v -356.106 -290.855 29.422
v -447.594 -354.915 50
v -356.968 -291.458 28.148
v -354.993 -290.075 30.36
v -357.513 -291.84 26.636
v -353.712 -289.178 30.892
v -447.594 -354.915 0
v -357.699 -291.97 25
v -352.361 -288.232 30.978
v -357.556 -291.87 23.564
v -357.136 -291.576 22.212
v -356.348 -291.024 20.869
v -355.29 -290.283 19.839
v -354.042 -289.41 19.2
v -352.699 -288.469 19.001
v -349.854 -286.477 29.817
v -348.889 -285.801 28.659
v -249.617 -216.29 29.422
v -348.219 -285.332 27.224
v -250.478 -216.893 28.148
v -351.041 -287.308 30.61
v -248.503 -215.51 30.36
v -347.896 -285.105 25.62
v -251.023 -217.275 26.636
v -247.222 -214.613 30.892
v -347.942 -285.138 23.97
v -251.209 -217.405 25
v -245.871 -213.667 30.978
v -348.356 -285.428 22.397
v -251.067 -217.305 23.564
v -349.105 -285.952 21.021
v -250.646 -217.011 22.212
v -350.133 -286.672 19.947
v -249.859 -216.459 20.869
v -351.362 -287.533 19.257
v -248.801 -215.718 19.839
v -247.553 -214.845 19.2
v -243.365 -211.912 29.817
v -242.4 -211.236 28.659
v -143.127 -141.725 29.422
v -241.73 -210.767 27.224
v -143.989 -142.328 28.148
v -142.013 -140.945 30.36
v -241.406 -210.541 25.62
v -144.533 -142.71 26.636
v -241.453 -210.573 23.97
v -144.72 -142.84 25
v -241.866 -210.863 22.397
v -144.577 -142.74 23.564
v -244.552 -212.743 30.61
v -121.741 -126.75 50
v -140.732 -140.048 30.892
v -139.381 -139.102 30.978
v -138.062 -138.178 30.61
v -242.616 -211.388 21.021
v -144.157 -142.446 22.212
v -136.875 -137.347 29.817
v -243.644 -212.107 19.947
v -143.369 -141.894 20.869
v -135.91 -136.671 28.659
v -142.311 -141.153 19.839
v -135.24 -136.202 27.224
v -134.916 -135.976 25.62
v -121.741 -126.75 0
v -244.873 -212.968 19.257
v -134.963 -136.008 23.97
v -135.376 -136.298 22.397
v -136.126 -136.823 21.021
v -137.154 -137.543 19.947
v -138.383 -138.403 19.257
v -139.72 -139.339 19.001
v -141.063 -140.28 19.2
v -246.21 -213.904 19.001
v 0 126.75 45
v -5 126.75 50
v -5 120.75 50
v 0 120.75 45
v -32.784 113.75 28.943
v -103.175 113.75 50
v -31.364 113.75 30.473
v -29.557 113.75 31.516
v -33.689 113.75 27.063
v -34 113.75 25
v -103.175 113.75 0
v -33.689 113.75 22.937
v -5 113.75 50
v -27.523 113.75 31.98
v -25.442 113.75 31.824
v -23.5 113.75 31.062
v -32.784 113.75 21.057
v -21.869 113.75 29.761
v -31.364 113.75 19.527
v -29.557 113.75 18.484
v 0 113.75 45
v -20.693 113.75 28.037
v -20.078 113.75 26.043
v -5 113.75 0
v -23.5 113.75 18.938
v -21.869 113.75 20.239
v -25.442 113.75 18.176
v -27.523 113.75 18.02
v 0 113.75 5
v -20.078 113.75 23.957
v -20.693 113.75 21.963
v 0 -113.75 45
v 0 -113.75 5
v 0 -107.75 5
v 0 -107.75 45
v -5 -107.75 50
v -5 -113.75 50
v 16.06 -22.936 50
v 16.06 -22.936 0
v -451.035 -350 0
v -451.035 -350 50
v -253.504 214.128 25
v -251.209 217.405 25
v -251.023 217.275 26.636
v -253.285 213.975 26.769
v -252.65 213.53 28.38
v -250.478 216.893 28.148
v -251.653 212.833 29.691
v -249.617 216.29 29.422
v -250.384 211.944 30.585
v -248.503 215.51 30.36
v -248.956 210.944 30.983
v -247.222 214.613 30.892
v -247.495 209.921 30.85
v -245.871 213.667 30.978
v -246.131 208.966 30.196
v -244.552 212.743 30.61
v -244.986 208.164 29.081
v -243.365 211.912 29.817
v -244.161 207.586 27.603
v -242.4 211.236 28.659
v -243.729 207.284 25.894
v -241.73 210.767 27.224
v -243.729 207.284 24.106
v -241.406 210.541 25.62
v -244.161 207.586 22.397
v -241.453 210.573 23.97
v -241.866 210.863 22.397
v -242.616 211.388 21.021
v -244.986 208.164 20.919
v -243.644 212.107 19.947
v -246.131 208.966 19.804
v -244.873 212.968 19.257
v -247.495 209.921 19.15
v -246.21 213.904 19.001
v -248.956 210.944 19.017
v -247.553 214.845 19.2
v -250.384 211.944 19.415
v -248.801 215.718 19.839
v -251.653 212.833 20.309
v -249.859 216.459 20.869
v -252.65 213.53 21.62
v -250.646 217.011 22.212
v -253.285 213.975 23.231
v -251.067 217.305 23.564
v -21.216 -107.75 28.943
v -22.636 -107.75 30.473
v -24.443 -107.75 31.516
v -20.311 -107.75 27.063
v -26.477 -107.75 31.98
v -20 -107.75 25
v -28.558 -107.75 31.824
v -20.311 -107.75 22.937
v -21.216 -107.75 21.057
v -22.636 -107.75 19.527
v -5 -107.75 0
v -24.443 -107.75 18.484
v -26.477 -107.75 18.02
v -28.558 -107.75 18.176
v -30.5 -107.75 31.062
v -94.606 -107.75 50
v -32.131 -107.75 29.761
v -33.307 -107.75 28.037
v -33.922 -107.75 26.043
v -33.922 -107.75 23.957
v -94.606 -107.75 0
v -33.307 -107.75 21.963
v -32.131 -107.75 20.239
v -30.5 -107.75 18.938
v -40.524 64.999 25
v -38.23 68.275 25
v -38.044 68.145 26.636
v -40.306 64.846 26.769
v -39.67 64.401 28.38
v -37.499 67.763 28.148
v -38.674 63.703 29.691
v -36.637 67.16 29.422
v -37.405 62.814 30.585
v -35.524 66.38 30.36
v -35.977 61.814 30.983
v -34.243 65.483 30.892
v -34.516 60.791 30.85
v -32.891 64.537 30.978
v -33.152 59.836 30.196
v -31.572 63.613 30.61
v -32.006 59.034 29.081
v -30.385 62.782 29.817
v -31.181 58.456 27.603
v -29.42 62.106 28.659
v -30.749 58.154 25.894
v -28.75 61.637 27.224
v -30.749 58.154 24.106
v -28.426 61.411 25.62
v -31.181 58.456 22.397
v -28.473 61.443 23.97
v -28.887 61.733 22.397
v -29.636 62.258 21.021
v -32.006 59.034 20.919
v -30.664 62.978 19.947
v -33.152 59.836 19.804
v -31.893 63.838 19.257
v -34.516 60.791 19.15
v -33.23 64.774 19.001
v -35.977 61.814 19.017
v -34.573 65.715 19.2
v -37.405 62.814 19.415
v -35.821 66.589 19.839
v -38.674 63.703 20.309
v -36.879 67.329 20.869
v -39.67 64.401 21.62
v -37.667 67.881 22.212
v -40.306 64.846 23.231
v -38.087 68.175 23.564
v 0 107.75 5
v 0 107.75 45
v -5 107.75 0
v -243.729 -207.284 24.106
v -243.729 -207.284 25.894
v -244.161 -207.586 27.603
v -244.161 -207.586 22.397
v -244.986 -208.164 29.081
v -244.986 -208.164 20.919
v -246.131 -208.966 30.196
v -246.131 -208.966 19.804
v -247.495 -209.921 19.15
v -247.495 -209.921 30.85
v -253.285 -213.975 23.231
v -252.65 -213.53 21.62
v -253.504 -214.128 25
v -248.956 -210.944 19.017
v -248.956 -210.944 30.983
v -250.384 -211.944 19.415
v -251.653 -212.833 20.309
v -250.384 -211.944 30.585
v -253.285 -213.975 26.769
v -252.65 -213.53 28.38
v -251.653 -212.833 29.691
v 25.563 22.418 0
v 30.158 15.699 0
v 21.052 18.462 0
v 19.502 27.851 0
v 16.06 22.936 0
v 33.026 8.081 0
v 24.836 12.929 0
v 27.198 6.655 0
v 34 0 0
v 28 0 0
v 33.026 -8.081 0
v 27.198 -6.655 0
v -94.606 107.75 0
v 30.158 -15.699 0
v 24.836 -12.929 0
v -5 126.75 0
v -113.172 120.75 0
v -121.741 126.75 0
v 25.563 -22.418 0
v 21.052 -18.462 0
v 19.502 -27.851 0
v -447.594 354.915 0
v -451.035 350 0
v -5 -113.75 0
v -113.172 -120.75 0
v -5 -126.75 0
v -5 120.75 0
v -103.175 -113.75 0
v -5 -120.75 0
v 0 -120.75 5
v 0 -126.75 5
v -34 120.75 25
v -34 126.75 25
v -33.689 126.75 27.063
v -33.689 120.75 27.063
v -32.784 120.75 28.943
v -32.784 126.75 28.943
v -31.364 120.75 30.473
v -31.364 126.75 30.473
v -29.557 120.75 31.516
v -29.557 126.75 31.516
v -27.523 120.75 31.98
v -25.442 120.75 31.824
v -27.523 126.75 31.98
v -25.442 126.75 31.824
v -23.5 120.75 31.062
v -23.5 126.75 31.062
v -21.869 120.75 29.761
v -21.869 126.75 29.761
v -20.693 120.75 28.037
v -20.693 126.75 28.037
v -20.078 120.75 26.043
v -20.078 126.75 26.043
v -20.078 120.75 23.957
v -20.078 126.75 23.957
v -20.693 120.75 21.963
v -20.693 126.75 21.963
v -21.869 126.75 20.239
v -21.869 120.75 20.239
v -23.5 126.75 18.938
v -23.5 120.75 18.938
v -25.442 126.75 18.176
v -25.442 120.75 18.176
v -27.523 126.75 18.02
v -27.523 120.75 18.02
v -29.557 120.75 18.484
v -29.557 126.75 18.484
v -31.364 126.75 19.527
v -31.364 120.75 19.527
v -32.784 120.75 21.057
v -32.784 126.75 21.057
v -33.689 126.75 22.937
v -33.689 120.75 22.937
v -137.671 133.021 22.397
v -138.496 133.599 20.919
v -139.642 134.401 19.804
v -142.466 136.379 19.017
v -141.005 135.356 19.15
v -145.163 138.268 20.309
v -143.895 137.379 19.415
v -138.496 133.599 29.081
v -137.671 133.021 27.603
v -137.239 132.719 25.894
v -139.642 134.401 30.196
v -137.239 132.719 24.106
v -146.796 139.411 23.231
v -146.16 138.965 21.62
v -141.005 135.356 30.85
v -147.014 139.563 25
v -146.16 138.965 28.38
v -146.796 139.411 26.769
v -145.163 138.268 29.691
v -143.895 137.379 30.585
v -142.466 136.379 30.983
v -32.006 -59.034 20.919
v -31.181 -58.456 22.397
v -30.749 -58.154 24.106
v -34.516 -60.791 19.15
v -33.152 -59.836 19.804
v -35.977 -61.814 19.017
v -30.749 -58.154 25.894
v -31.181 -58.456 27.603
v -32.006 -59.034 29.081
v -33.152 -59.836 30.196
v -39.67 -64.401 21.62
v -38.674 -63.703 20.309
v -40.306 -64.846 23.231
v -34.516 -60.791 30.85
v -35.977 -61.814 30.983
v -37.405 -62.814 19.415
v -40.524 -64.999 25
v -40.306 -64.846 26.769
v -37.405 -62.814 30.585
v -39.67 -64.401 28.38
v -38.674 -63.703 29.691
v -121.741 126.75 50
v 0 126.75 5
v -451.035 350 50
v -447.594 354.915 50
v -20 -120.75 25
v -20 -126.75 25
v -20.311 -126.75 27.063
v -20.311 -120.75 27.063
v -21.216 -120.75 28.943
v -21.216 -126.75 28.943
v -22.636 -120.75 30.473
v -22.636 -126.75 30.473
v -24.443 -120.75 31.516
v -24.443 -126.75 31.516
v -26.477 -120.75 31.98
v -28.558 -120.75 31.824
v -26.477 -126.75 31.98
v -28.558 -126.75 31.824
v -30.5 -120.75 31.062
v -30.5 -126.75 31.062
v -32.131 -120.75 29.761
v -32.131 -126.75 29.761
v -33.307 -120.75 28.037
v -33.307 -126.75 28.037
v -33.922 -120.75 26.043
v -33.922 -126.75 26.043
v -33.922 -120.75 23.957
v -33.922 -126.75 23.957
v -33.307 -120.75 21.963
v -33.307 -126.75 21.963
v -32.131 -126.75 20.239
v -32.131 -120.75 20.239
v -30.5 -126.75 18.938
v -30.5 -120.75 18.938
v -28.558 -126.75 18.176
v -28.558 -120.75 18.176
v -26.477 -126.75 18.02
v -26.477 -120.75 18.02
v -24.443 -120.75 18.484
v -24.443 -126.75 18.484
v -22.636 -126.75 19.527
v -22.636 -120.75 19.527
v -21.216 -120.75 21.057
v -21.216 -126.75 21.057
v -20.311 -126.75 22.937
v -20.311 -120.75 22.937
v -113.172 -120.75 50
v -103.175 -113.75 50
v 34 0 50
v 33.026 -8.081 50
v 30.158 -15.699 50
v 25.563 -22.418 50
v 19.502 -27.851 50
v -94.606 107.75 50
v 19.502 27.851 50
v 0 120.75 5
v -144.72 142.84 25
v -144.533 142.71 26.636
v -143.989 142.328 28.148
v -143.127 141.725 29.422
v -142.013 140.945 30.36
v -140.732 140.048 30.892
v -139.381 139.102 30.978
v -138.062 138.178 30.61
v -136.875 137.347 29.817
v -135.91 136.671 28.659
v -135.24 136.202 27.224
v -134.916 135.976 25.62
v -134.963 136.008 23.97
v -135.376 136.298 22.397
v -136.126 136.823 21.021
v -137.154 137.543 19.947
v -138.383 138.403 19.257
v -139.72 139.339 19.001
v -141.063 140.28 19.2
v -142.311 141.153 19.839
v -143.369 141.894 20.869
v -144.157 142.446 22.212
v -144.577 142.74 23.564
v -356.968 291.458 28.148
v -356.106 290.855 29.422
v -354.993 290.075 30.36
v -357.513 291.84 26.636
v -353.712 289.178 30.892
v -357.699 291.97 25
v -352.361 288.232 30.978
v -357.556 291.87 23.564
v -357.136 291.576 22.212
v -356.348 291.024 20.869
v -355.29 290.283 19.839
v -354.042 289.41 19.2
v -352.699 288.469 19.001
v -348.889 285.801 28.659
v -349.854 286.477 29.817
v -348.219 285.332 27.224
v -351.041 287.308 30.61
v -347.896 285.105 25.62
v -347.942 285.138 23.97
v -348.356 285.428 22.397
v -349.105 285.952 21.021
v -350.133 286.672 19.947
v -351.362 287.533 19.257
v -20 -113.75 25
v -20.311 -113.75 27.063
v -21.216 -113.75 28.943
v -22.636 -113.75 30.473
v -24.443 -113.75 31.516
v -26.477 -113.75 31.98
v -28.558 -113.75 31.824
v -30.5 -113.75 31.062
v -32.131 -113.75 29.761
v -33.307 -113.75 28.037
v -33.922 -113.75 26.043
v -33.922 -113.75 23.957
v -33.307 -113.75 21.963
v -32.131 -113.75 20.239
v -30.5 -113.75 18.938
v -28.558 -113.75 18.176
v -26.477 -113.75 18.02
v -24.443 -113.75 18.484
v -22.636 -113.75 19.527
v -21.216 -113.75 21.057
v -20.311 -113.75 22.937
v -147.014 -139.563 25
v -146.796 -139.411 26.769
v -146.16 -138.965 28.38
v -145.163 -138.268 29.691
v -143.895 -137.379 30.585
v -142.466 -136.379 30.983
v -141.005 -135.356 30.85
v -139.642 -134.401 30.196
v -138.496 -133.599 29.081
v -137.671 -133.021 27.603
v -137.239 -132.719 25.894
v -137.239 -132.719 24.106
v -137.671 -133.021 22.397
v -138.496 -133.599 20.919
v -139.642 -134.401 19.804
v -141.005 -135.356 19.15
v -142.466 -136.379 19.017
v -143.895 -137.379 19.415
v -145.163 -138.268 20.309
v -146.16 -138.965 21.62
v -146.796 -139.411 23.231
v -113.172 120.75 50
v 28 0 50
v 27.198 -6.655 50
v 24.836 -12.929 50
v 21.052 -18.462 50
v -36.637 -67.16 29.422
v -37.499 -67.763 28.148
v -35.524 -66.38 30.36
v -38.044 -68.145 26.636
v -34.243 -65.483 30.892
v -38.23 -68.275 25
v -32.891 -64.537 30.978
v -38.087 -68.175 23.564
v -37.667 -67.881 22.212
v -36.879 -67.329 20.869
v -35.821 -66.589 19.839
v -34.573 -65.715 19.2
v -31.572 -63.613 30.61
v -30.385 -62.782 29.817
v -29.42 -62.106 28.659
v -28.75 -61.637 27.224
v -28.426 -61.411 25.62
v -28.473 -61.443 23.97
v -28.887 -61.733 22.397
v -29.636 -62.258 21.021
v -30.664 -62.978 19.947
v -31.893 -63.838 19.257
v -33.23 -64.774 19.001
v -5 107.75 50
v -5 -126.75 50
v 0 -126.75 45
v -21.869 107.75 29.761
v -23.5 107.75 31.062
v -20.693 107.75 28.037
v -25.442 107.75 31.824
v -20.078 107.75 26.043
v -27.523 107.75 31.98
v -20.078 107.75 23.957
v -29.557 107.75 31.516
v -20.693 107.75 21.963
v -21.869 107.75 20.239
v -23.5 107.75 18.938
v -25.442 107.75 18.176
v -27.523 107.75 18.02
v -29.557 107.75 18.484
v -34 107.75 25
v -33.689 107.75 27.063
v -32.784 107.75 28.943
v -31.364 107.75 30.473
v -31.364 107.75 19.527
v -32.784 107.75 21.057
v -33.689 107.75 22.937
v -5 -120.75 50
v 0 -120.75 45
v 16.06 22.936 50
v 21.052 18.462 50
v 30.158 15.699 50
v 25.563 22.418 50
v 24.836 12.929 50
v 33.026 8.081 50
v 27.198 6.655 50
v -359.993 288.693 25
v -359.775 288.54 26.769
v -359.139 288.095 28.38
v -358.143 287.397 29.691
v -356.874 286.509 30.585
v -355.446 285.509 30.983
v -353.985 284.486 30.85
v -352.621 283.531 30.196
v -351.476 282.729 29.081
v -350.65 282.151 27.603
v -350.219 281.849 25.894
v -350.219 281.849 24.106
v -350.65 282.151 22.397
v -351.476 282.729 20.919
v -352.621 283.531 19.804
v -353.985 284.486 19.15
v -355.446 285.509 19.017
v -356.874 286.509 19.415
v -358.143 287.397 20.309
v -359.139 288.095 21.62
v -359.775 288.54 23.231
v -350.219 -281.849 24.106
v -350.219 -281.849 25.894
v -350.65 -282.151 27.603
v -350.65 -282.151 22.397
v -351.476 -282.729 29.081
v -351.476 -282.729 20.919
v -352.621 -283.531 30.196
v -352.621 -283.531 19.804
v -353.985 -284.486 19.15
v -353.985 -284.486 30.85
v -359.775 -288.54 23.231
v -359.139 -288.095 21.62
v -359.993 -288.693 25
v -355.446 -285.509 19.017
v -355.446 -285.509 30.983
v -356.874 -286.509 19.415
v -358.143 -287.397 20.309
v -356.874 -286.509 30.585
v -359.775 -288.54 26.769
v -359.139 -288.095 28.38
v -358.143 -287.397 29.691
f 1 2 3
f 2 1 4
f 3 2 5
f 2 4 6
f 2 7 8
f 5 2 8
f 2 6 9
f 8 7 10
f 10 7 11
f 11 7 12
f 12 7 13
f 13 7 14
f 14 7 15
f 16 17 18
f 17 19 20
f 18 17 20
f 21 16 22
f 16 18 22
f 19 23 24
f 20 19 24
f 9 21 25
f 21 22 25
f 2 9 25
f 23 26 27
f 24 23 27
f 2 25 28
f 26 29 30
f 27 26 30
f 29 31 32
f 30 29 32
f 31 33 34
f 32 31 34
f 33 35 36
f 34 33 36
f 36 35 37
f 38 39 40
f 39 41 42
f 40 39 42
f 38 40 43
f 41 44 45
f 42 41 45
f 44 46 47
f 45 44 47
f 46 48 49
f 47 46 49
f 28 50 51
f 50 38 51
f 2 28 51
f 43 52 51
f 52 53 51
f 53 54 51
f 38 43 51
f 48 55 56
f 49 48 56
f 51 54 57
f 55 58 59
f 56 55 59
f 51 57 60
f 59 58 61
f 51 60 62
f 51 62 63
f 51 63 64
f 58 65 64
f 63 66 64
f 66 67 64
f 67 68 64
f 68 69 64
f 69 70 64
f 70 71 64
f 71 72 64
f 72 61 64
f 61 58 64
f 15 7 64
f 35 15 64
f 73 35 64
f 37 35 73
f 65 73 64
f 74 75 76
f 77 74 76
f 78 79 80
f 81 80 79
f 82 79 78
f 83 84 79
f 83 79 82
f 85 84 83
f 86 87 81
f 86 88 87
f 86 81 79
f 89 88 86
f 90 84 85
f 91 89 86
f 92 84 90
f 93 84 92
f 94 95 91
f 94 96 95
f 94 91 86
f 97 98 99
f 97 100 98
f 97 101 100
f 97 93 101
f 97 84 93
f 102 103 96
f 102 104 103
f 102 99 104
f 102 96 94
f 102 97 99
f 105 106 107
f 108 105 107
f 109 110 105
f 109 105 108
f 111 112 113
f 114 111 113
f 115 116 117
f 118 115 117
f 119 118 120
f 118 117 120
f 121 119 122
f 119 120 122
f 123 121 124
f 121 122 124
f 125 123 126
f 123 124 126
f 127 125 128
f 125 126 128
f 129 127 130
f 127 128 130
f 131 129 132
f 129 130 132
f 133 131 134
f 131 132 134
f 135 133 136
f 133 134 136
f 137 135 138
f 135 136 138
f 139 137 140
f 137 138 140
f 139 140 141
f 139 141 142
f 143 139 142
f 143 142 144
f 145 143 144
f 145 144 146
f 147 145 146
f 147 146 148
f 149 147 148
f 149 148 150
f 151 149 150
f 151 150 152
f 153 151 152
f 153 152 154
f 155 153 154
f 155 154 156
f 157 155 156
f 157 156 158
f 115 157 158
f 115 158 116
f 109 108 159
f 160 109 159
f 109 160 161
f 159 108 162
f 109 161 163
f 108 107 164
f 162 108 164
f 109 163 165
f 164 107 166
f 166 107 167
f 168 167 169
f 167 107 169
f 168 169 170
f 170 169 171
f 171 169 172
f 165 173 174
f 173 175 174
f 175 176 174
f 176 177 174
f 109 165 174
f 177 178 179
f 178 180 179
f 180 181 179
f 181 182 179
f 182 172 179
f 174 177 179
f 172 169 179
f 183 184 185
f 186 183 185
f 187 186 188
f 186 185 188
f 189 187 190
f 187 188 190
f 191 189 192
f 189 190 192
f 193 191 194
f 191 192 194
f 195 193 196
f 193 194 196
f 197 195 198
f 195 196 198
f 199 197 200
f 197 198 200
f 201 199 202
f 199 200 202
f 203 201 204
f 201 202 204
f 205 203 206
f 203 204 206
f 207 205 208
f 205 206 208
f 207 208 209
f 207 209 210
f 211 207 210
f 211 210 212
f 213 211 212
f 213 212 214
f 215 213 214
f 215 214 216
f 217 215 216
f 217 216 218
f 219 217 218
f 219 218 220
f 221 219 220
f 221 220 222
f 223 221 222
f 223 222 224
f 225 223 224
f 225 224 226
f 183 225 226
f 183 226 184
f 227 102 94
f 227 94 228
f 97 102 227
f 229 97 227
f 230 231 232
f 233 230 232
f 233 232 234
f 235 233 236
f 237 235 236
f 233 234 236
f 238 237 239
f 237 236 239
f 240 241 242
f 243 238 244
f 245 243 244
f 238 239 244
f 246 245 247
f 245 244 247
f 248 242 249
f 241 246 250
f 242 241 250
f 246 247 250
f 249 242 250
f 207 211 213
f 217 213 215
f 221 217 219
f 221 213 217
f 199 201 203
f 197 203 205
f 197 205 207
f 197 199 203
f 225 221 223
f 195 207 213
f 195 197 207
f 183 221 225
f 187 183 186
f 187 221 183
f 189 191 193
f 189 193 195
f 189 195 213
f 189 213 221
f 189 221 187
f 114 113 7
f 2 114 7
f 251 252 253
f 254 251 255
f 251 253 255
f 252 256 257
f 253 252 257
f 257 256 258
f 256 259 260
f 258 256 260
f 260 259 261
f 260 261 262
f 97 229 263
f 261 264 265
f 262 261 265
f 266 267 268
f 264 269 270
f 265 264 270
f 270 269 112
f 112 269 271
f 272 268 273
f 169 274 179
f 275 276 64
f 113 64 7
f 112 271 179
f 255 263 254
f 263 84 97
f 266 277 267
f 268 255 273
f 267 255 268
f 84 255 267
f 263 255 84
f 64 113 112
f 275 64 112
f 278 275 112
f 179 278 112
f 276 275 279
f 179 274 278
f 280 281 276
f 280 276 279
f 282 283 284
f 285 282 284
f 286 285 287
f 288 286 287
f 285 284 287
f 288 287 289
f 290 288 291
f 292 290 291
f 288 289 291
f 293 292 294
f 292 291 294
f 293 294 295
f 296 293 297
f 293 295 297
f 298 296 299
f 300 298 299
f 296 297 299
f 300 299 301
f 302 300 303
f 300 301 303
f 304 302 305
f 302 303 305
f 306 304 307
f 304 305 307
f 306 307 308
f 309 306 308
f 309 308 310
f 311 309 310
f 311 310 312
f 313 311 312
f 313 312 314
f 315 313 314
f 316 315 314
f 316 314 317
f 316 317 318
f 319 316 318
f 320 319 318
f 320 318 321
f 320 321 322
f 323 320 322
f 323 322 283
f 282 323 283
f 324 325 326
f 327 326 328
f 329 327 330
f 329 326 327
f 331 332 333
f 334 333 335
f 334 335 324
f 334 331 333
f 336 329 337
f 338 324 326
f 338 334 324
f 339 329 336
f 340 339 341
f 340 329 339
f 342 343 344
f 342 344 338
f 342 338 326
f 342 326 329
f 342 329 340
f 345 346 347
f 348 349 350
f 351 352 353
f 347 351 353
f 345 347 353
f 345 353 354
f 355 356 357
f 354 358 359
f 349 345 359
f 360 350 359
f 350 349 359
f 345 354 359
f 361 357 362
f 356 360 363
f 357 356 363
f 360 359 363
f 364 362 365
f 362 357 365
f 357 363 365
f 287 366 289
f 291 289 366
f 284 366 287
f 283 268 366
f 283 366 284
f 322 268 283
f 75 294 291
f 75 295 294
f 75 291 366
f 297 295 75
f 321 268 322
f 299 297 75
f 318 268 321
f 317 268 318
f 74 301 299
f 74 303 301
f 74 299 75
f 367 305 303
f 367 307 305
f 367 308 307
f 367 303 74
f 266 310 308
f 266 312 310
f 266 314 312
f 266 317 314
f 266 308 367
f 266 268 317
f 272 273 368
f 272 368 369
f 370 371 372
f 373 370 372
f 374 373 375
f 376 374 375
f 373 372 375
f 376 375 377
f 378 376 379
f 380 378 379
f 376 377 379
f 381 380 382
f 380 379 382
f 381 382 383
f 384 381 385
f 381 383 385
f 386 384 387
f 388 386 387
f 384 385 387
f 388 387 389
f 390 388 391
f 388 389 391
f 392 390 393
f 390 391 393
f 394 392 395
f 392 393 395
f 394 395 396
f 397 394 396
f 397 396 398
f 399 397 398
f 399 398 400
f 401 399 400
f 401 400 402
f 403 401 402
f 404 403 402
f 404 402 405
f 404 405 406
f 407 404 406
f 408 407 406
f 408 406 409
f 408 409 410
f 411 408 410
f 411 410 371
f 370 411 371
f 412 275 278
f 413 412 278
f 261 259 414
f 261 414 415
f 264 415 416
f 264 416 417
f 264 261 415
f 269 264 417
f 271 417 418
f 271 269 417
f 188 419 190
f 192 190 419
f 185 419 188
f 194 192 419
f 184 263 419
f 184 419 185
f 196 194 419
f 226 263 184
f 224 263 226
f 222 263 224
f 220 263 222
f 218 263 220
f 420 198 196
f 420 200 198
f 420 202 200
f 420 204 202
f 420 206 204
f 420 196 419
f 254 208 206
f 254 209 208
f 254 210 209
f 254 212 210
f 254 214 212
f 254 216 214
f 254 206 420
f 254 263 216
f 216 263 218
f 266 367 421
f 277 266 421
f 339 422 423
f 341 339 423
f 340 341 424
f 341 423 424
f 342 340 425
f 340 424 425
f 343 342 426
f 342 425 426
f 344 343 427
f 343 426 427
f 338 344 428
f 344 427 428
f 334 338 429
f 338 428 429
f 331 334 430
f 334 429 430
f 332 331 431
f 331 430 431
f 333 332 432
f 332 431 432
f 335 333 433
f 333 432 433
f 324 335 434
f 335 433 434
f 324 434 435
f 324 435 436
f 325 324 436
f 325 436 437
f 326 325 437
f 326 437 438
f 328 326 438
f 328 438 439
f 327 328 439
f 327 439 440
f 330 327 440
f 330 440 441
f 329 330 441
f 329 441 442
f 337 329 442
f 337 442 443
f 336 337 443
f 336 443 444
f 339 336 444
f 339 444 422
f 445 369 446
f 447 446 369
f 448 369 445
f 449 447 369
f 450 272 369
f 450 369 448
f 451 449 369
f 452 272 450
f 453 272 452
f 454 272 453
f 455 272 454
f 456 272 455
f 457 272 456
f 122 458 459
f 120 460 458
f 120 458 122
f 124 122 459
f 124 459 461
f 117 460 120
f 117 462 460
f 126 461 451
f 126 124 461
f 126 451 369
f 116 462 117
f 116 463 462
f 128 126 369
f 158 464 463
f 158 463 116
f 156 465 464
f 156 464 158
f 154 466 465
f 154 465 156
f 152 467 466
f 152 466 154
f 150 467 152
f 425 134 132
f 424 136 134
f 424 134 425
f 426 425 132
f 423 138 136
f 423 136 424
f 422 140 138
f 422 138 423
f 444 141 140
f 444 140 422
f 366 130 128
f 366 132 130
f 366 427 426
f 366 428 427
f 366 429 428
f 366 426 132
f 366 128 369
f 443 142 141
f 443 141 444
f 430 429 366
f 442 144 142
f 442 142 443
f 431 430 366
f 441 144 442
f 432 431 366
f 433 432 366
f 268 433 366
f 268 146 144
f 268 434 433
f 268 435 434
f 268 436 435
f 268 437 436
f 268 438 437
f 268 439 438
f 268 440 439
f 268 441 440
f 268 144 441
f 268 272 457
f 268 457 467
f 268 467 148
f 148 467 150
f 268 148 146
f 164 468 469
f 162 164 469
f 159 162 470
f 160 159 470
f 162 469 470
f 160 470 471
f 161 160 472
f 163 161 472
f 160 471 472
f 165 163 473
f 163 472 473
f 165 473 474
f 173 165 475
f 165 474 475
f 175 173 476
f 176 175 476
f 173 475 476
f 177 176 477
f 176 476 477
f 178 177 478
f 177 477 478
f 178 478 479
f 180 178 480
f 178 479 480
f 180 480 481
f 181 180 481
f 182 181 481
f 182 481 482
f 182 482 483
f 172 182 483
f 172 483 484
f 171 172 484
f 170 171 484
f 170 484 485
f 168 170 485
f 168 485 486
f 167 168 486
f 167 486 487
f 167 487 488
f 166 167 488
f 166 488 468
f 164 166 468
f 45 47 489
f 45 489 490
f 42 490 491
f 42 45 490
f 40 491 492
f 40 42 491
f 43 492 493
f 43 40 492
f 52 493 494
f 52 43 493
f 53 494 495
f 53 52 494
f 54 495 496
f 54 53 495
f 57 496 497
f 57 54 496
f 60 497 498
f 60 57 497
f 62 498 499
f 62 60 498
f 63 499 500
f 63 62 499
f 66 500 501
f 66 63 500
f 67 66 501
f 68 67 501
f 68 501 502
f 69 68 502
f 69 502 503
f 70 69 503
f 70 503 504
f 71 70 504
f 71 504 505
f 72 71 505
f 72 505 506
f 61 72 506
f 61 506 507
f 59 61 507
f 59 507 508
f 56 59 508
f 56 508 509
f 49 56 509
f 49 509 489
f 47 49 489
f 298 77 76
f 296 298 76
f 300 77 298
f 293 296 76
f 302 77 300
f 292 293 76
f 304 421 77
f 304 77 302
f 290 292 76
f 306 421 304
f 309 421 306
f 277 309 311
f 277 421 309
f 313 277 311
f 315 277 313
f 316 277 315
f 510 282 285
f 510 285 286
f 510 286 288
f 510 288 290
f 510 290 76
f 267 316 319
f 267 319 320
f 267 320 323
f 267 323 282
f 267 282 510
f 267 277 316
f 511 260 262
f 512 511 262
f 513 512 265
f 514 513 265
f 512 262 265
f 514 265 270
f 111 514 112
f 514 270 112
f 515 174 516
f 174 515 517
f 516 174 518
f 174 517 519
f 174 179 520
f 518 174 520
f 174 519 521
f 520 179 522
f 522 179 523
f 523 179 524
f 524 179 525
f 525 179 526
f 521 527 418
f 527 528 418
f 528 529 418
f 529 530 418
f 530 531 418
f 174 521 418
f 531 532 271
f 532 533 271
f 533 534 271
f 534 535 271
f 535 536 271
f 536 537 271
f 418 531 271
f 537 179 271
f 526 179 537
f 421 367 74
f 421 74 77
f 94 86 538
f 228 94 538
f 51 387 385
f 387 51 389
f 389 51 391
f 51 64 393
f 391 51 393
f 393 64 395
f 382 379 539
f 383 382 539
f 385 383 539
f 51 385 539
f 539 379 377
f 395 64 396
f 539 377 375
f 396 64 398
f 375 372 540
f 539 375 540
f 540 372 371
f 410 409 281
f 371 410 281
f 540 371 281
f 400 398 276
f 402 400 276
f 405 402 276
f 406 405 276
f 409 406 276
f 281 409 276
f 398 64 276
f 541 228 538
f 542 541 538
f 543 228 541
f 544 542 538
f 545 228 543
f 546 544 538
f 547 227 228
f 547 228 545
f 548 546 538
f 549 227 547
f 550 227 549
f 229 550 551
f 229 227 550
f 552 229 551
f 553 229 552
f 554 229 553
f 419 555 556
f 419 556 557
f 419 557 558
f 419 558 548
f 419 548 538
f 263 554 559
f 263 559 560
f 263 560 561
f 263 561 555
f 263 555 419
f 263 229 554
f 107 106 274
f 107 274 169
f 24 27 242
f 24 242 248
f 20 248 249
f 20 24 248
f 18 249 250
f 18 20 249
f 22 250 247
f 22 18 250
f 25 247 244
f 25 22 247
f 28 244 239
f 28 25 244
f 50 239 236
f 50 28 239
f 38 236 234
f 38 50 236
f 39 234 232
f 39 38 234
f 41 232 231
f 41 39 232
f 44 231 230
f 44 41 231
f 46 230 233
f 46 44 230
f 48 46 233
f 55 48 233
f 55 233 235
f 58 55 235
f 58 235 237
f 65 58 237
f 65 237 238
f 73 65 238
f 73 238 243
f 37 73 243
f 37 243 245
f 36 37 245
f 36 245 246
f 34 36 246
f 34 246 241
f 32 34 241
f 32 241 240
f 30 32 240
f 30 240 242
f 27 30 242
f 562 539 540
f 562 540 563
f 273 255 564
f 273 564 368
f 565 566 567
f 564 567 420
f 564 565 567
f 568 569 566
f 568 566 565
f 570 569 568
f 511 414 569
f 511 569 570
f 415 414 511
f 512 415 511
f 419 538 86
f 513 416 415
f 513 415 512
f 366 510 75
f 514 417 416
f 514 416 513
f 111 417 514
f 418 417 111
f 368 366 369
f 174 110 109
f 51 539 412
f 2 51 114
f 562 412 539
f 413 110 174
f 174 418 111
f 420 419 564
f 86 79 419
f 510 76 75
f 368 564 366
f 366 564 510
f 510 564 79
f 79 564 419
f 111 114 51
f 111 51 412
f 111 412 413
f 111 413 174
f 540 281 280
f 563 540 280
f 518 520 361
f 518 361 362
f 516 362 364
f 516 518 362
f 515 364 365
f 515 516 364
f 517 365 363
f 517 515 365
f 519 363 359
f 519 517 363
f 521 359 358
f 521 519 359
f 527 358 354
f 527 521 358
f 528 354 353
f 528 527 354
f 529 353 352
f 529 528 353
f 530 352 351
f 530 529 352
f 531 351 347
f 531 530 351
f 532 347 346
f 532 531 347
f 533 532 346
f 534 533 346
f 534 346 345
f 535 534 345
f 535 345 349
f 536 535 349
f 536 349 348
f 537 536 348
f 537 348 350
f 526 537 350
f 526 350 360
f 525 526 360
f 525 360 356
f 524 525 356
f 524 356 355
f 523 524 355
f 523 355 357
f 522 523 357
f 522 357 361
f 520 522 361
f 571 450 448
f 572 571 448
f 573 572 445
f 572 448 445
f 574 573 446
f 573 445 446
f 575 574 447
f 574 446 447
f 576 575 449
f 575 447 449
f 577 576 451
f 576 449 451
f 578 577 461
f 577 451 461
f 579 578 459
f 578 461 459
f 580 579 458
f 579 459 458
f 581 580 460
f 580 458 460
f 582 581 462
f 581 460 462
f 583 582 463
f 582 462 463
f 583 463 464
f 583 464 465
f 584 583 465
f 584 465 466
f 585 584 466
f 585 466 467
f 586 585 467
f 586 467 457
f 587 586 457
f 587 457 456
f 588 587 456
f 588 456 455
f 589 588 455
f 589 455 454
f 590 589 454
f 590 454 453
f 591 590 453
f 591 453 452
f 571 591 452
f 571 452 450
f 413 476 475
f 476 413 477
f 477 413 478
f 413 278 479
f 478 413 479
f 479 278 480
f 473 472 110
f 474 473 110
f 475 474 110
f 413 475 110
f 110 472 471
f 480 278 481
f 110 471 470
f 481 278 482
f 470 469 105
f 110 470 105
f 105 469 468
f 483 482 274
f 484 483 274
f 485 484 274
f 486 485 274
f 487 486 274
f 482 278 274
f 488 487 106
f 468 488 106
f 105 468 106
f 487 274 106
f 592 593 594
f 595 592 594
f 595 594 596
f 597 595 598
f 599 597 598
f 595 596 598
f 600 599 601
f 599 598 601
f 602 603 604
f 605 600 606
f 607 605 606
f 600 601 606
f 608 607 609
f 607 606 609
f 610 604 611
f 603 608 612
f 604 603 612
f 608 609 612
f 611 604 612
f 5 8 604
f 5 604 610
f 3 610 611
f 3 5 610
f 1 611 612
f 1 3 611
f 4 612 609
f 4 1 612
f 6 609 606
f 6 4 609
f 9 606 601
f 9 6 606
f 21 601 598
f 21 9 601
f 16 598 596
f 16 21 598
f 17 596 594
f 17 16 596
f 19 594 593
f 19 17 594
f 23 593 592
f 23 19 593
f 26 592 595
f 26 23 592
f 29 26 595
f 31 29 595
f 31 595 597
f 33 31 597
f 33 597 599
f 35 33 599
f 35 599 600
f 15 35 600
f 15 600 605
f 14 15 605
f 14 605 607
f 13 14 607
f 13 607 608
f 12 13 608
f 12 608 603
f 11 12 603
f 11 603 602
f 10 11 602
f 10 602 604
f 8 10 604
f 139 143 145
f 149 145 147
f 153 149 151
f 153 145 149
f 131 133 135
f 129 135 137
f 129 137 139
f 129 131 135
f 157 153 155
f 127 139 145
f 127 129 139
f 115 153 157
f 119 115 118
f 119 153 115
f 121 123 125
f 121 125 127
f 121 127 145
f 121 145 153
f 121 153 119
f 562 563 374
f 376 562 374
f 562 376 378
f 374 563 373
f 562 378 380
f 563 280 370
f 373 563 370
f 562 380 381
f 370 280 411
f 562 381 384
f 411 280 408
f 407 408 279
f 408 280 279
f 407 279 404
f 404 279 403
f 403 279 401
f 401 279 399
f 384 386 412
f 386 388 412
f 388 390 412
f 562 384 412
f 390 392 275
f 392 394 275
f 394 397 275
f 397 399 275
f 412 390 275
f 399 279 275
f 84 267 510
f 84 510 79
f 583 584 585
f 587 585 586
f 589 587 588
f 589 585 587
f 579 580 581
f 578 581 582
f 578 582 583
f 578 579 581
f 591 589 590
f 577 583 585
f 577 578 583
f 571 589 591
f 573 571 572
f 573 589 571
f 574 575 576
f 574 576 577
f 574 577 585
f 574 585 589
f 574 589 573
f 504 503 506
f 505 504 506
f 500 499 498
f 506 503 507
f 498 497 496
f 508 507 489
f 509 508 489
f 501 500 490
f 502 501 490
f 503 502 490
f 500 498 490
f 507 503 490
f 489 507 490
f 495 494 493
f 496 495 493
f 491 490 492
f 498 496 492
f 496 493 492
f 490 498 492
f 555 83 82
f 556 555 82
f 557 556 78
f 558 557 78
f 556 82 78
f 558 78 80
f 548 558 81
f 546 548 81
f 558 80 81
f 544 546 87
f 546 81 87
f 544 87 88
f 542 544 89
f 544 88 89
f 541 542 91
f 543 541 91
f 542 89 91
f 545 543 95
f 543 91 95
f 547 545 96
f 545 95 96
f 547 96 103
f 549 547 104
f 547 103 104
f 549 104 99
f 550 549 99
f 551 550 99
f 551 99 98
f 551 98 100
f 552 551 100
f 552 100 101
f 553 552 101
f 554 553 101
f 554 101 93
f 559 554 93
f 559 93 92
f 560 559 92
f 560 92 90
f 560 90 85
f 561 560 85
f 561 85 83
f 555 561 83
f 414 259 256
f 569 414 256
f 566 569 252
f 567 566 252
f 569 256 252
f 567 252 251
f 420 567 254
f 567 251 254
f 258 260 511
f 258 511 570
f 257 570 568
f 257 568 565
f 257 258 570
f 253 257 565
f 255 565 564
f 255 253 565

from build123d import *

# Parameters (mm, degrees)
PAD_DEPTH           = 50
PAD001_DEPTH        = 50
SKETCH015_R         = 6
POCKET005_DEPTH     = 10
LINEARPATTERN_COUNT = 4
LINEARPATTERN_PITCH = 130
PAD007_DEPTH        = 10
CHAMFER_SIZE        = 5
SKETCH016_R         = 7
POCKET_DEPTH        = 20
SKETCH017_R         = 7
POCKET006_DEPTH     = 20


with BuildPart() as part:
    # Sketch → Pad (new body)
    with BuildSketch(Plane.XY):
        with BuildLine():
            Line((-447.593833, 354.914912), (19.501599, 27.85117))
            ThreePointArc((34, 0), (30.158368, 15.699453), (19.501599, 27.85117))
            Line((28, 0), (34, 0))
            ThreePointArc((28, 0), (24.836303, 12.928961), (16.06014, 22.936257))
            Line((16.06014, 22.936257), (-451.035292, 350))
            Line((-451.035292, 350), (-447.593833, 354.914912))
        make_face()
    extrude(amount=PAD_DEPTH)

    # Sketch001 → Pad001 (join)
    with BuildSketch(Plane.XY):
        Polygon((-95, 107.75), (-103.568888, 113.75), (0, 113.75), (0, 107.75), align=None)
        Polygon((-113.431112, 120.75), (-122, 126.75), (0, 126.75), (0, 120.75), align=None)
    extrude(amount=PAD001_DEPTH)

    # Sketch015 → Pocket005 (cut)
    with BuildSketch(Plane(origin=(22.943057, 32.766082, 0), x_dir=(-0.819152, 0.573576, 0), z_dir=(0.573576, 0.819152, 0))):
        with Locations((454.477006, 25)):
            Circle(SKETCH015_R)
    pocket005 = extrude(amount=-POCKET005_DEPTH, mode=Mode.SUBTRACT)

    # LinearPattern: Pocket005 ×4
    with Locations(*[Vector(0.819152, -0.573576, 0) * (i * LINEARPATTERN_PITCH) for i in range(1, LINEARPATTERN_COUNT)]):
        add(pocket005, mode=Mode.SUBTRACT)

    # Sketch001 → Pad007 (join)
    with BuildSketch(Plane.XY):
        Polygon((-95, 107.75), (-103.568888, 113.75), (0, 113.75), (0, 107.75), align=None)
        Polygon((-113.431112, 120.75), (-122, 126.75), (0, 126.75), (0, 120.75), align=None)
    extrude(amount=PAD007_DEPTH)

    # Mirrored: part across XZ


with BuildPart() as part_1:
    add(part.part)
    add(part.part.mirror(Plane.XZ))

    # Chamfer
    chamfer_edges = [part_1.edges().sort_by_distance(p)[0] for p in [
        (0, -110.75, 50),
        (0, -123.75, 50),
        (0, -123.75, 0),
        (0, -110.75, 0),
        (0, 123.75, 50),
        (0, 110.75, 50),
        (0, 110.75, 0),
        (0, 123.75, 0),
    ]]
    chamfer(chamfer_edges, length=CHAMFER_SIZE)

    # Sketch016 (on Face21 of Chamfer) → Pocket (cut)
    with BuildSketch(Plane.XZ.offset(126.75)):
        with Locations((-27, 25)):
            Circle(SKETCH016_R)
    extrude(amount=-POCKET_DEPTH, mode=Mode.SUBTRACT)

    # Sketch017 (on Face1 of Pocket) → Pocket006 (cut)
    with BuildSketch(Plane(origin=(0, 126.75, 0), x_dir=(-1, 0, 0), z_dir=(0, 1, 0))):
        with Locations((27, 25)):
            Circle(SKETCH017_R)
    extrude(amount=-POCKET006_DEPTH, mode=Mode.SUBTRACT)


solid = part_1.part
